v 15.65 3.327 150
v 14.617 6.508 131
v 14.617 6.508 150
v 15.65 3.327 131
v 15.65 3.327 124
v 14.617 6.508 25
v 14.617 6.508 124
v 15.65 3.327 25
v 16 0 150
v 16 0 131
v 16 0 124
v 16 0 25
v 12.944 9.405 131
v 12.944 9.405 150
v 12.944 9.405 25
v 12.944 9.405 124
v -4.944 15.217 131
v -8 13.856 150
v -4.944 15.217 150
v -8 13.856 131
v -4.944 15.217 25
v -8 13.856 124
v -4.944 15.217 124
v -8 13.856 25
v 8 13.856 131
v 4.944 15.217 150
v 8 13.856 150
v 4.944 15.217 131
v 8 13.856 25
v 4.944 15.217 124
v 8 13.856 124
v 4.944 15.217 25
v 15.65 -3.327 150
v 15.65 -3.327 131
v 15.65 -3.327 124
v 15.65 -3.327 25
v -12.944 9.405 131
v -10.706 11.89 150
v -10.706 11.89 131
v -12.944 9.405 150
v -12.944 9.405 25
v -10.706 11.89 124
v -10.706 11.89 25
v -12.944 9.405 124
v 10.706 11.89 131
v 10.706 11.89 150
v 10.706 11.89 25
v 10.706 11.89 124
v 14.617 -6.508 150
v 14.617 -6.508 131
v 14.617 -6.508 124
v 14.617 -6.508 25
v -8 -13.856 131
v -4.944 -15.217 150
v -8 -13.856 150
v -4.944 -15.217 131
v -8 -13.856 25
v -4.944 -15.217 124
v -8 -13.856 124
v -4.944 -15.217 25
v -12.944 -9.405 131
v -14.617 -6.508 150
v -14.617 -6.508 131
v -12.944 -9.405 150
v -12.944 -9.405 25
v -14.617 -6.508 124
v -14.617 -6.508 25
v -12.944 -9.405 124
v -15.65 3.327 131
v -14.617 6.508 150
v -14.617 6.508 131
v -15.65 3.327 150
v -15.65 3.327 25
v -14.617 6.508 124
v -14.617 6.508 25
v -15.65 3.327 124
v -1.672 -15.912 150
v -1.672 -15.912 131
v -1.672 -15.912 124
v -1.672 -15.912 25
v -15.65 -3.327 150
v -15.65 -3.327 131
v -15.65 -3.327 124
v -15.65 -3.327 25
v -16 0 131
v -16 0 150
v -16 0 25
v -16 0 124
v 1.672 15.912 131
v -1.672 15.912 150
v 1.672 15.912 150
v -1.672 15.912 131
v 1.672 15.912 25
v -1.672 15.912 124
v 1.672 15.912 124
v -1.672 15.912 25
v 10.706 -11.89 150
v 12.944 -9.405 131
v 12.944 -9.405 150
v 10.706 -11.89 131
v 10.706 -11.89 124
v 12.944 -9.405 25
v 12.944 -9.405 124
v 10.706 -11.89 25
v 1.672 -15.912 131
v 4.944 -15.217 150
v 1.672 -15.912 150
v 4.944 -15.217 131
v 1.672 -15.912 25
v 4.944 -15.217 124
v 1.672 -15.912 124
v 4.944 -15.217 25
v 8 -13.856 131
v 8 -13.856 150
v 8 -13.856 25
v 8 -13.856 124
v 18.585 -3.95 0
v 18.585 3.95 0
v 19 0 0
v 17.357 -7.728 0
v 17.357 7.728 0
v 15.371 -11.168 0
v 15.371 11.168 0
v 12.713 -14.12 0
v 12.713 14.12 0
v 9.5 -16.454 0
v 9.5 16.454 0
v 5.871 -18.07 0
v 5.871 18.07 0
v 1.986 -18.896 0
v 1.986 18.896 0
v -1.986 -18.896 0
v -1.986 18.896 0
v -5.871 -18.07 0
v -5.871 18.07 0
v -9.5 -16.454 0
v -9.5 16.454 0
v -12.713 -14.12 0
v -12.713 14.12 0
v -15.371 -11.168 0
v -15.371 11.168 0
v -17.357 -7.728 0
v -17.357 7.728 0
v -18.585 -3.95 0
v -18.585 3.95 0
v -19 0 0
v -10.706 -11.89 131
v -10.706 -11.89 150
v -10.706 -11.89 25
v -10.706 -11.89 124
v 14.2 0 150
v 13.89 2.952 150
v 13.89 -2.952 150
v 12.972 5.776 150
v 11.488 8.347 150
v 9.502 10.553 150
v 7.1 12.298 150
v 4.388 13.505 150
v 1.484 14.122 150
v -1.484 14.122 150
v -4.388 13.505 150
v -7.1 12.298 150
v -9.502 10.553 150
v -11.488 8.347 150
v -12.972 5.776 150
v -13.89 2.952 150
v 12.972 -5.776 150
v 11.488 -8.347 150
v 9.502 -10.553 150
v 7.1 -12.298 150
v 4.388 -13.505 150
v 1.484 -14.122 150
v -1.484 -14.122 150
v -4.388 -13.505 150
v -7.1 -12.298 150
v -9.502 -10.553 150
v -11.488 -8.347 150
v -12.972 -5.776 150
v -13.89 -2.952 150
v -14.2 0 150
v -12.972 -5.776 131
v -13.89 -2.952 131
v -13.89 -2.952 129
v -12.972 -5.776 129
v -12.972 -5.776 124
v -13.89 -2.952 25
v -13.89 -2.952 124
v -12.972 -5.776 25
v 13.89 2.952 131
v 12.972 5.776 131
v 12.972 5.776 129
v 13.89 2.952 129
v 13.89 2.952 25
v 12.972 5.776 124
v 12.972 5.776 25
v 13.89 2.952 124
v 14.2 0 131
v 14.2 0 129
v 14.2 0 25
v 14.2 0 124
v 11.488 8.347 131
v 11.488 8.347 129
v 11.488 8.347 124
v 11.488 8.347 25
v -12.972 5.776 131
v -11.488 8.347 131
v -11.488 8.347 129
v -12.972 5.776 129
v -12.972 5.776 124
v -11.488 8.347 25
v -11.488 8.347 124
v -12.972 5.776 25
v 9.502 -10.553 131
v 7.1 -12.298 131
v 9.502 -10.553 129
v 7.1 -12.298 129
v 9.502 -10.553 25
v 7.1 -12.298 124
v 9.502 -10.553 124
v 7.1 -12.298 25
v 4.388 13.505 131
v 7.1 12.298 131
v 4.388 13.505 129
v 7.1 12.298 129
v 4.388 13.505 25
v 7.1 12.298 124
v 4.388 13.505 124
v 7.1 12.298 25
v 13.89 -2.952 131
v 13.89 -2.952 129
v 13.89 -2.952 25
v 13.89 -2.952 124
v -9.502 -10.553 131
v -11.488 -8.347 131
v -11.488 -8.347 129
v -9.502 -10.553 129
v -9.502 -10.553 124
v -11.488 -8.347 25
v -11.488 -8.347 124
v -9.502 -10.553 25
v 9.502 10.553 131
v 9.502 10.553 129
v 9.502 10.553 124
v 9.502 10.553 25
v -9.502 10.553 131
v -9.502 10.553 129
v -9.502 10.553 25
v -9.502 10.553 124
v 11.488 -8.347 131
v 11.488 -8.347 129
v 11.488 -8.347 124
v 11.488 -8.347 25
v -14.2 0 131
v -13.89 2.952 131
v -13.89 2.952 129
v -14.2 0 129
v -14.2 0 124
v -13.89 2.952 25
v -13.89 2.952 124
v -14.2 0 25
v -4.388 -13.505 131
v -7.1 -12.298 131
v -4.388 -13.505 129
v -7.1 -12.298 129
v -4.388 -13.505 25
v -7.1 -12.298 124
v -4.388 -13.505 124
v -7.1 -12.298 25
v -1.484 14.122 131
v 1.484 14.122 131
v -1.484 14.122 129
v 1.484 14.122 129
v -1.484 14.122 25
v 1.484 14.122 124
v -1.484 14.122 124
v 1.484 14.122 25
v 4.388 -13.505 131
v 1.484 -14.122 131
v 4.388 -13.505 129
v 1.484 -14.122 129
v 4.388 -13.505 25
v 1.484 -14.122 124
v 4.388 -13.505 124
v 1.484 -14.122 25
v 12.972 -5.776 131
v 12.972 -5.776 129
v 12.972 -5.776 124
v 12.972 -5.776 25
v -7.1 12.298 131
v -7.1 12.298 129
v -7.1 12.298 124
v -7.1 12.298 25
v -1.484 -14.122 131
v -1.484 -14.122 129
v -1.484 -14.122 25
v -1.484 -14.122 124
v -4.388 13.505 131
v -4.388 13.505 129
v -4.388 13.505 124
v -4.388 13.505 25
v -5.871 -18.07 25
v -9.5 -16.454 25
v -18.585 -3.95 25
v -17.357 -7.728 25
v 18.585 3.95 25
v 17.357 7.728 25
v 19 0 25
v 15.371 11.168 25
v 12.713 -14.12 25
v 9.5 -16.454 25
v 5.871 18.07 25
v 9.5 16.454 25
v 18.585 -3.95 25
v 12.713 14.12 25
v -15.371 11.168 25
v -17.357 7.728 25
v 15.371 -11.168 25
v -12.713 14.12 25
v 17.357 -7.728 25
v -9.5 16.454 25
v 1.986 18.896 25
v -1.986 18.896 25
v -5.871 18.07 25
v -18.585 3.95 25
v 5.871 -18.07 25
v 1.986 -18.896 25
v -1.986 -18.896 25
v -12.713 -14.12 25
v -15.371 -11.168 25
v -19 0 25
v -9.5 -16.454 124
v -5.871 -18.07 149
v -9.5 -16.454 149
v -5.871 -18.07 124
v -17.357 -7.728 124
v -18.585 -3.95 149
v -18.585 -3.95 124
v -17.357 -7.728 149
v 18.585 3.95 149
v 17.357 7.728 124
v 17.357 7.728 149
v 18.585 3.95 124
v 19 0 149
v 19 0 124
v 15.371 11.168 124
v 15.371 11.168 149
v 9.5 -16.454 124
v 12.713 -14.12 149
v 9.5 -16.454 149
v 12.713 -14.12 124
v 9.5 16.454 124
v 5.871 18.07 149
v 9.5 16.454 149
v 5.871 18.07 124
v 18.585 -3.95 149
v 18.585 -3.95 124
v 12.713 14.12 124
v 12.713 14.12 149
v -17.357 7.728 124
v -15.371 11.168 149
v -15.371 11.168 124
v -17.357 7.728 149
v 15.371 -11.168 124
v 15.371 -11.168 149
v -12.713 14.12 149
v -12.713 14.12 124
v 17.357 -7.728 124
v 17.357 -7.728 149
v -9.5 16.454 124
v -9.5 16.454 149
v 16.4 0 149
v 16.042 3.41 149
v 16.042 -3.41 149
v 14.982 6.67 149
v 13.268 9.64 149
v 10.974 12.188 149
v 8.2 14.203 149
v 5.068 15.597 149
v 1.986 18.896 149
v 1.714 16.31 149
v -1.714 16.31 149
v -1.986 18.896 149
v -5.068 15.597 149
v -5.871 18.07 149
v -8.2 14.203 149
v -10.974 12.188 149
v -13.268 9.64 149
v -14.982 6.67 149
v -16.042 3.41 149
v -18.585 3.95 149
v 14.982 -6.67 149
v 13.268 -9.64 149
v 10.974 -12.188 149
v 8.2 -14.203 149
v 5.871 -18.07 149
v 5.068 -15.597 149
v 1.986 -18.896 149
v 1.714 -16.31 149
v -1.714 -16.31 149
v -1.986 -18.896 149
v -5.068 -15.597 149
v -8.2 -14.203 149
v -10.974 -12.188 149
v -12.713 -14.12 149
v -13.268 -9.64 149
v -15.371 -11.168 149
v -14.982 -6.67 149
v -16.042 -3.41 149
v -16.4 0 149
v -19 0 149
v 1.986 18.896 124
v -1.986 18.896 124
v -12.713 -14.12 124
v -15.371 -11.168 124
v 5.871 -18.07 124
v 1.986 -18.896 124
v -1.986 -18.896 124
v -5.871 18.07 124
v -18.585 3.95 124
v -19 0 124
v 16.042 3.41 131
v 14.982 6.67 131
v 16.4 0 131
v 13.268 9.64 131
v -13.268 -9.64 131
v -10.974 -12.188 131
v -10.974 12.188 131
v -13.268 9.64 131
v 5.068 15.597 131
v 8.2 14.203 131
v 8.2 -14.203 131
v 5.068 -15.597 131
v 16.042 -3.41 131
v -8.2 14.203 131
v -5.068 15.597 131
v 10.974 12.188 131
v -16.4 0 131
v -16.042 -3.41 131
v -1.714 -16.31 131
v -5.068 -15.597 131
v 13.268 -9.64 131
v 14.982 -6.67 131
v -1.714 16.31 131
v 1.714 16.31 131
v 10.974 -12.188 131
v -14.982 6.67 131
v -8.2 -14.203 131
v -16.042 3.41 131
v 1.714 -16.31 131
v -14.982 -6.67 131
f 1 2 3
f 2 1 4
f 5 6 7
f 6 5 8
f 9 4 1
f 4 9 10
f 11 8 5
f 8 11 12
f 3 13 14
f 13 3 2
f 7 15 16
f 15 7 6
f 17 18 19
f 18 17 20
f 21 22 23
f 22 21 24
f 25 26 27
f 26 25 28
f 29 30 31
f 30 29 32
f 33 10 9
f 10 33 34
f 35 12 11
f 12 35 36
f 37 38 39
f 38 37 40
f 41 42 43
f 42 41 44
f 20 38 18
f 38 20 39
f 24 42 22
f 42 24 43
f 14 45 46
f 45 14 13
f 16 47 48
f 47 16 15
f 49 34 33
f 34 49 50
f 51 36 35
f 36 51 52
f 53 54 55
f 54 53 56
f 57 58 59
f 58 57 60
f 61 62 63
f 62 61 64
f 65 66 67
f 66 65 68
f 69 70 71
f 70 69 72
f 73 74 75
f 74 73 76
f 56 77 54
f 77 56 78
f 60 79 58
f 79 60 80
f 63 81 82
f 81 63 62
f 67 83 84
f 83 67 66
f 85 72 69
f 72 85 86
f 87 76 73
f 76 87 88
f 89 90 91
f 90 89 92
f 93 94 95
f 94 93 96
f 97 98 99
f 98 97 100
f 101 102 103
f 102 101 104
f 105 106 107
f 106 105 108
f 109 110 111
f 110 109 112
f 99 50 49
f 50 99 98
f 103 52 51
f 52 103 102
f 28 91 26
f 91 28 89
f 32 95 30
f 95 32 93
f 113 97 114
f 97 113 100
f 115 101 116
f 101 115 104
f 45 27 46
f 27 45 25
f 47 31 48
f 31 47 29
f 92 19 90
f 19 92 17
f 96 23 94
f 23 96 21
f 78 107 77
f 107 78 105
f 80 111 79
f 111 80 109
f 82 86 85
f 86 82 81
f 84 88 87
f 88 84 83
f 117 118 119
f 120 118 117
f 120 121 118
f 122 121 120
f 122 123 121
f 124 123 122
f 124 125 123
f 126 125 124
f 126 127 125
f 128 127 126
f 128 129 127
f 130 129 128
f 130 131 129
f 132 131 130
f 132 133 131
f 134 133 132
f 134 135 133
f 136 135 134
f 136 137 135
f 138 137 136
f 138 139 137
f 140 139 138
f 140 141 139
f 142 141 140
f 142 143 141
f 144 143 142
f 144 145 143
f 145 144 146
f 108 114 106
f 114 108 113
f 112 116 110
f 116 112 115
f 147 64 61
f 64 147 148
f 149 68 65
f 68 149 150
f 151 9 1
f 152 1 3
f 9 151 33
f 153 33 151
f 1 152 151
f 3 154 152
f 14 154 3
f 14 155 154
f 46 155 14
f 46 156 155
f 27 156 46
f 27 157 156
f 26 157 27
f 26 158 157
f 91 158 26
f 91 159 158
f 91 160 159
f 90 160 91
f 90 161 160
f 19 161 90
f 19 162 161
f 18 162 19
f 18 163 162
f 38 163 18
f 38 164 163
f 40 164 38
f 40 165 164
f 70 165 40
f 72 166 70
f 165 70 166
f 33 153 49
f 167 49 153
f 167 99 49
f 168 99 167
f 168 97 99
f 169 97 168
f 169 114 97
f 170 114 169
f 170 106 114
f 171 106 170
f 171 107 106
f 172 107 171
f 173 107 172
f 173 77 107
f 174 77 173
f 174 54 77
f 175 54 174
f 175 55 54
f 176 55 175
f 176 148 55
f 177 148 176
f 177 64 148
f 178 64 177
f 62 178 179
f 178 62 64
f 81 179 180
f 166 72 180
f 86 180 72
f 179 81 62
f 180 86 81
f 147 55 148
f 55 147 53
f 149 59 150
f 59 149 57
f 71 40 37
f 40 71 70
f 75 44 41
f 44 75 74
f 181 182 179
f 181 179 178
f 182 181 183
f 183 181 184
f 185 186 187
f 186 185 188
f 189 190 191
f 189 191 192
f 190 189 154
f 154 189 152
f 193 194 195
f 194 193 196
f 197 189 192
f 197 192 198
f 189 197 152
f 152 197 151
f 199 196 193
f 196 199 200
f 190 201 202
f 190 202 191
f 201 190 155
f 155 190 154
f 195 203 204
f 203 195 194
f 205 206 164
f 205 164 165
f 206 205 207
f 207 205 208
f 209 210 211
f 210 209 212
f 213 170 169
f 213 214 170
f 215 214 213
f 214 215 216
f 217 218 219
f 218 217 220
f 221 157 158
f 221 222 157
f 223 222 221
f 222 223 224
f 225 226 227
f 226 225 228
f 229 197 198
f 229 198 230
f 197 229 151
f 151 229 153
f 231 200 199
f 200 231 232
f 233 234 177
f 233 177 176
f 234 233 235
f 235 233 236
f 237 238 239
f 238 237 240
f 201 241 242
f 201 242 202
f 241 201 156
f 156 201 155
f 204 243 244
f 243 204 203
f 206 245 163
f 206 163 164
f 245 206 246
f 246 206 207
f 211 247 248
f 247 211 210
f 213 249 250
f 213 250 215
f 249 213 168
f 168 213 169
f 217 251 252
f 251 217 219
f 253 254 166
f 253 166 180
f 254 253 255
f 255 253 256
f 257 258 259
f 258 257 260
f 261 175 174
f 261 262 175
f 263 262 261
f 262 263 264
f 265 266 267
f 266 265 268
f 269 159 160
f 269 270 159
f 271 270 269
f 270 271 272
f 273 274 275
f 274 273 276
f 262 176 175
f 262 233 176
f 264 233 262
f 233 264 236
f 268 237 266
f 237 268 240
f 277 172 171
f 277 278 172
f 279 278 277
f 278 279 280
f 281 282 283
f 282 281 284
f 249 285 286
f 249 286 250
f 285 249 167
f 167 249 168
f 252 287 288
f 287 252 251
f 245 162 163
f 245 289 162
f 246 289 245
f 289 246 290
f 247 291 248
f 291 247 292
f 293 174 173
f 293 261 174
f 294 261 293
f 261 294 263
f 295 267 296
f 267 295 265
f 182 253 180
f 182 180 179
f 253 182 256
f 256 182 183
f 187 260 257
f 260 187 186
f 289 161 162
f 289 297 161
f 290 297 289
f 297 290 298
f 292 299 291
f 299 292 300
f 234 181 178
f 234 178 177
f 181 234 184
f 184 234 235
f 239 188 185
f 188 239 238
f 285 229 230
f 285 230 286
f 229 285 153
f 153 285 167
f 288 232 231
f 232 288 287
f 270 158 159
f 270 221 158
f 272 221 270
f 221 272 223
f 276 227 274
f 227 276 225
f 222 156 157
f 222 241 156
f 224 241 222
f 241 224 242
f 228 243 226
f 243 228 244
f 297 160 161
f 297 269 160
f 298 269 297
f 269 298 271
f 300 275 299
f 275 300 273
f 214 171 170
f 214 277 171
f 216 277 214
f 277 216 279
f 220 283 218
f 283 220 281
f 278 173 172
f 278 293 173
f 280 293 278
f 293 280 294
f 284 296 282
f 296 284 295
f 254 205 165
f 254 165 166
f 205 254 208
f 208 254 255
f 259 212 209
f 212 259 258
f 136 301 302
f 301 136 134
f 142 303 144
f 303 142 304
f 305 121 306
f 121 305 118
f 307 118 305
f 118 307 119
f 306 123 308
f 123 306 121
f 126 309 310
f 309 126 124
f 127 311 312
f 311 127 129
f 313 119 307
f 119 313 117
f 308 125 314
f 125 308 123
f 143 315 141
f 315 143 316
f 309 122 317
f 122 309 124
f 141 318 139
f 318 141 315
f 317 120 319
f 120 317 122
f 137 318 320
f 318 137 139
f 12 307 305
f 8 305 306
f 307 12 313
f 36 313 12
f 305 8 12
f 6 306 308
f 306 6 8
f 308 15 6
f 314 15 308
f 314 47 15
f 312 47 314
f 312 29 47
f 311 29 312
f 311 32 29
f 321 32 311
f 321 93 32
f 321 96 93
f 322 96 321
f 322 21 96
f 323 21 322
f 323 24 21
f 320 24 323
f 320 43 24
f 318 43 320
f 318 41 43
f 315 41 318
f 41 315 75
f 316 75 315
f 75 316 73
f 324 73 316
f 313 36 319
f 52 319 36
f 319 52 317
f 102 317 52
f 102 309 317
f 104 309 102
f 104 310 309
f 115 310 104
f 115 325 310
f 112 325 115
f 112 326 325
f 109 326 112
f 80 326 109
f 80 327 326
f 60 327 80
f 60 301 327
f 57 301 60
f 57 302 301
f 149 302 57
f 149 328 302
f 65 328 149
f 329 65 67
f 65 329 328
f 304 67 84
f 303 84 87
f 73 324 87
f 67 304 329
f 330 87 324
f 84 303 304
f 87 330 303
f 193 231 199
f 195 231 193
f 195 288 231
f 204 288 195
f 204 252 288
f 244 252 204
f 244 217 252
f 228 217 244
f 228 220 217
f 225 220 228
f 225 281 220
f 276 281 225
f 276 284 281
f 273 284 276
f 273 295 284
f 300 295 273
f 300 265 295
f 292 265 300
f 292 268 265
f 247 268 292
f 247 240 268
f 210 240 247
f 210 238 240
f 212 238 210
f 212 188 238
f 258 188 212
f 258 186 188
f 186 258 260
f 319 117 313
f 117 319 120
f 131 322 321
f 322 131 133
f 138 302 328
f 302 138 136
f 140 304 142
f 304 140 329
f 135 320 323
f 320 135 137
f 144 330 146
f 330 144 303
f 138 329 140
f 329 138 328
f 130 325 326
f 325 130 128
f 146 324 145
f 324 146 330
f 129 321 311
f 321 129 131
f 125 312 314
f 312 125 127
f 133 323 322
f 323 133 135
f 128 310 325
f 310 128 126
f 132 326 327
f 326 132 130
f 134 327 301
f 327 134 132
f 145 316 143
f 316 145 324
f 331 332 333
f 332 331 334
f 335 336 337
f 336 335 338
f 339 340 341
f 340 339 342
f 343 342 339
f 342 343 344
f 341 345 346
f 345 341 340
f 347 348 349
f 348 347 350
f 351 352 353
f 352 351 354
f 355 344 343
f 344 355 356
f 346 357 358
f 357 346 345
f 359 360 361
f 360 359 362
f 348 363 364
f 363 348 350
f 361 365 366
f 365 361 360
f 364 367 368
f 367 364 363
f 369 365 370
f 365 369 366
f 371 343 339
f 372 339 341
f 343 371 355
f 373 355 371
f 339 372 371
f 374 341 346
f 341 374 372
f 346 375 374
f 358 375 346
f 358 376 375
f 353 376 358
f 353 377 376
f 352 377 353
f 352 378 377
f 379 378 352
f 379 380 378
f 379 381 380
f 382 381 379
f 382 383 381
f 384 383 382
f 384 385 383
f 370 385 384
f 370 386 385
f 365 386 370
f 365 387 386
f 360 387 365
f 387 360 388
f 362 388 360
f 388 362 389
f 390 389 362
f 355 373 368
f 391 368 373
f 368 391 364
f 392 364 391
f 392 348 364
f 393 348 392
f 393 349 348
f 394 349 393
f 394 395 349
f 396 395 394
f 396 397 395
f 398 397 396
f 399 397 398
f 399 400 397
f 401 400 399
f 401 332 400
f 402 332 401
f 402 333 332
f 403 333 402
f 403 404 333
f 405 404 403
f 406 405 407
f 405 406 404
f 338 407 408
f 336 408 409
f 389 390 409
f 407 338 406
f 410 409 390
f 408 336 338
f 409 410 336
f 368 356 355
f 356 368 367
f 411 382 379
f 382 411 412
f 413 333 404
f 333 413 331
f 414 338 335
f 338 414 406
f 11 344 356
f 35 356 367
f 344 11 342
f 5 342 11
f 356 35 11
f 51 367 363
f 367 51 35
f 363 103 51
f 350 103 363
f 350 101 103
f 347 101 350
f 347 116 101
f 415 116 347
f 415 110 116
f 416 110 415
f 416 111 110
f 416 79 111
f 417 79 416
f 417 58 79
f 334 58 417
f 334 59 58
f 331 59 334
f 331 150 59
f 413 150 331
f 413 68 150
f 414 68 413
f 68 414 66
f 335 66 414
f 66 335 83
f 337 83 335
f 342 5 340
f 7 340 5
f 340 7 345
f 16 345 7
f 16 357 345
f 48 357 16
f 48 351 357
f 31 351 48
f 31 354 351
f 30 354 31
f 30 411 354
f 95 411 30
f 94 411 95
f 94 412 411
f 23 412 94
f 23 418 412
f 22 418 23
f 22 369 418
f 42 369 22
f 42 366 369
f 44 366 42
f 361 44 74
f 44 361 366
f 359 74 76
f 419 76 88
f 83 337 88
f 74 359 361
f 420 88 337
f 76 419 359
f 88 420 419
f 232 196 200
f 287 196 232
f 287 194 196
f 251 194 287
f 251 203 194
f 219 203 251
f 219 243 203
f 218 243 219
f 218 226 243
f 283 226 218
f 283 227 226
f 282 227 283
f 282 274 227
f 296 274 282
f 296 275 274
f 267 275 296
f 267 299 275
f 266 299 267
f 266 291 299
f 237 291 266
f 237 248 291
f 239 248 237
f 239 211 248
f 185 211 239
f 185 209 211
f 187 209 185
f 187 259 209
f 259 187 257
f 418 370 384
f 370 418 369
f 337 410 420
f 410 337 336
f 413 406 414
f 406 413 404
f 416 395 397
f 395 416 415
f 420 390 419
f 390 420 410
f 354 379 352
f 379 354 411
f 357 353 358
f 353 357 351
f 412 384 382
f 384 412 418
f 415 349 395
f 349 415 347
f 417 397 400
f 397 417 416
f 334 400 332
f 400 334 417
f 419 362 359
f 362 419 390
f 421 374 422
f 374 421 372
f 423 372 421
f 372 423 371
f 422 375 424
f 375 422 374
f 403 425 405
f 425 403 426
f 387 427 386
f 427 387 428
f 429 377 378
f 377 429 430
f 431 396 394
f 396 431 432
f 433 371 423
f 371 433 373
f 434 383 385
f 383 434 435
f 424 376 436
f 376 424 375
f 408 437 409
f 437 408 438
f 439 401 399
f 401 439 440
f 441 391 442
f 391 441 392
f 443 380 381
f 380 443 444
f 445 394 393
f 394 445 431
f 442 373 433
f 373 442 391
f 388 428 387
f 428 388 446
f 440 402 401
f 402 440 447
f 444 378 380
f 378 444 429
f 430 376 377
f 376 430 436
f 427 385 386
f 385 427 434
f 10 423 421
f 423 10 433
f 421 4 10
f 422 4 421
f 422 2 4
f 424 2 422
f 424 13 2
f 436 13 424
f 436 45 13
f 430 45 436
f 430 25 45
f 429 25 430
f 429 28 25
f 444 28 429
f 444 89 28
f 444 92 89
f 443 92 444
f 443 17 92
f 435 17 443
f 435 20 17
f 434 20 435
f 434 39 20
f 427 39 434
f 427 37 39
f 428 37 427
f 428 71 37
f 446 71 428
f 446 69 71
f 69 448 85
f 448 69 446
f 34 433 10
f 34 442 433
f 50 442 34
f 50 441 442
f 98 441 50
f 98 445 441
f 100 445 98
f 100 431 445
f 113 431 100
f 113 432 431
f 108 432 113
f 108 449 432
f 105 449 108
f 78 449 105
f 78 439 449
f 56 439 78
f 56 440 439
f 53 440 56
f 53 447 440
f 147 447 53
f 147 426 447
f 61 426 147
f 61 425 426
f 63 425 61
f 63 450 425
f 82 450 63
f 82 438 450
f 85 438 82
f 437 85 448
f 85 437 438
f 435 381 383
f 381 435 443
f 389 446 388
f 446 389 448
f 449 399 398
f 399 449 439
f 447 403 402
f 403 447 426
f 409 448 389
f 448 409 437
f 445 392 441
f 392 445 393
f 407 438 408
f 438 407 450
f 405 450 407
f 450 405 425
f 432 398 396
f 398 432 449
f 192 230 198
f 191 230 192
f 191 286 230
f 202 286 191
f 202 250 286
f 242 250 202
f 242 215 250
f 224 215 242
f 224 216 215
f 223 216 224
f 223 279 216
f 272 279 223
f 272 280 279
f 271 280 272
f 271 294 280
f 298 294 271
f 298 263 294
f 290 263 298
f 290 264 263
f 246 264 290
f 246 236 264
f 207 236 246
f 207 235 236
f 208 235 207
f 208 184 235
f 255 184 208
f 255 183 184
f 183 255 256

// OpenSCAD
// Parameters
standard = 32; //[32:32:1]
nominal_diameter = 32; //[16:64:1]
length_mm = 150; //[75:300:1]
pipe_od = 32; //[20:64:0.5]
pipe_wall = 1.8; //[1.0:3.6:0.1]
fitting_length = 25; //[12:50:1]
fitting_od_extra = 6; //[2:12:0.5]
fitting_wall_extra = 1.2; //[0.5:3:0.1]
socket_depth = 18; //[8:40:1]
socket_clearance = 0.4; //[0.1:1.0:0.05]
stop_ring_thickness = 2; //[1:5:0.5]
overlap = 1; //[0.5:2:0.1]

// HT Pipe - complete geometry
module ht_pipe() {
  color([0.85, 0.85, 0.8]) {
    // Pipe body
    difference() {
      cylinder(h=length_mm, r=pipe_od/2, center=false);
      translate([0, 0, -overlap])
        cylinder(h=length_mm + 2*overlap, r=pipe_od/2 - pipe_wall, center=false);
    }
    
    // End fitting
    difference() {
      union() {
        cylinder(h=fitting_length, r=pipe_od/2 + fitting_od_extra/2, center=false);
        translate([0, 0, length_mm - fitting_length - overlap])
          cylinder(h=fitting_length, r=pipe_od/2 + fitting_od_extra/2, center=false);
      }
      translate([0, 0, length_mm - socket_depth - overlap])
        cylinder(h=socket_depth + overlap, r=pipe_od/2 + socket_clearance, center=false);
      translate([0, 0, length_mm - socket_depth - stop_ring_thickness - overlap])
        cylinder(h=stop_ring_thickness + overlap, r=pipe_od/2 - pipe_wall, center=false);
    }
  }
}

// Assembly
module assembly() {
  ht_pipe();
}

assembly();
